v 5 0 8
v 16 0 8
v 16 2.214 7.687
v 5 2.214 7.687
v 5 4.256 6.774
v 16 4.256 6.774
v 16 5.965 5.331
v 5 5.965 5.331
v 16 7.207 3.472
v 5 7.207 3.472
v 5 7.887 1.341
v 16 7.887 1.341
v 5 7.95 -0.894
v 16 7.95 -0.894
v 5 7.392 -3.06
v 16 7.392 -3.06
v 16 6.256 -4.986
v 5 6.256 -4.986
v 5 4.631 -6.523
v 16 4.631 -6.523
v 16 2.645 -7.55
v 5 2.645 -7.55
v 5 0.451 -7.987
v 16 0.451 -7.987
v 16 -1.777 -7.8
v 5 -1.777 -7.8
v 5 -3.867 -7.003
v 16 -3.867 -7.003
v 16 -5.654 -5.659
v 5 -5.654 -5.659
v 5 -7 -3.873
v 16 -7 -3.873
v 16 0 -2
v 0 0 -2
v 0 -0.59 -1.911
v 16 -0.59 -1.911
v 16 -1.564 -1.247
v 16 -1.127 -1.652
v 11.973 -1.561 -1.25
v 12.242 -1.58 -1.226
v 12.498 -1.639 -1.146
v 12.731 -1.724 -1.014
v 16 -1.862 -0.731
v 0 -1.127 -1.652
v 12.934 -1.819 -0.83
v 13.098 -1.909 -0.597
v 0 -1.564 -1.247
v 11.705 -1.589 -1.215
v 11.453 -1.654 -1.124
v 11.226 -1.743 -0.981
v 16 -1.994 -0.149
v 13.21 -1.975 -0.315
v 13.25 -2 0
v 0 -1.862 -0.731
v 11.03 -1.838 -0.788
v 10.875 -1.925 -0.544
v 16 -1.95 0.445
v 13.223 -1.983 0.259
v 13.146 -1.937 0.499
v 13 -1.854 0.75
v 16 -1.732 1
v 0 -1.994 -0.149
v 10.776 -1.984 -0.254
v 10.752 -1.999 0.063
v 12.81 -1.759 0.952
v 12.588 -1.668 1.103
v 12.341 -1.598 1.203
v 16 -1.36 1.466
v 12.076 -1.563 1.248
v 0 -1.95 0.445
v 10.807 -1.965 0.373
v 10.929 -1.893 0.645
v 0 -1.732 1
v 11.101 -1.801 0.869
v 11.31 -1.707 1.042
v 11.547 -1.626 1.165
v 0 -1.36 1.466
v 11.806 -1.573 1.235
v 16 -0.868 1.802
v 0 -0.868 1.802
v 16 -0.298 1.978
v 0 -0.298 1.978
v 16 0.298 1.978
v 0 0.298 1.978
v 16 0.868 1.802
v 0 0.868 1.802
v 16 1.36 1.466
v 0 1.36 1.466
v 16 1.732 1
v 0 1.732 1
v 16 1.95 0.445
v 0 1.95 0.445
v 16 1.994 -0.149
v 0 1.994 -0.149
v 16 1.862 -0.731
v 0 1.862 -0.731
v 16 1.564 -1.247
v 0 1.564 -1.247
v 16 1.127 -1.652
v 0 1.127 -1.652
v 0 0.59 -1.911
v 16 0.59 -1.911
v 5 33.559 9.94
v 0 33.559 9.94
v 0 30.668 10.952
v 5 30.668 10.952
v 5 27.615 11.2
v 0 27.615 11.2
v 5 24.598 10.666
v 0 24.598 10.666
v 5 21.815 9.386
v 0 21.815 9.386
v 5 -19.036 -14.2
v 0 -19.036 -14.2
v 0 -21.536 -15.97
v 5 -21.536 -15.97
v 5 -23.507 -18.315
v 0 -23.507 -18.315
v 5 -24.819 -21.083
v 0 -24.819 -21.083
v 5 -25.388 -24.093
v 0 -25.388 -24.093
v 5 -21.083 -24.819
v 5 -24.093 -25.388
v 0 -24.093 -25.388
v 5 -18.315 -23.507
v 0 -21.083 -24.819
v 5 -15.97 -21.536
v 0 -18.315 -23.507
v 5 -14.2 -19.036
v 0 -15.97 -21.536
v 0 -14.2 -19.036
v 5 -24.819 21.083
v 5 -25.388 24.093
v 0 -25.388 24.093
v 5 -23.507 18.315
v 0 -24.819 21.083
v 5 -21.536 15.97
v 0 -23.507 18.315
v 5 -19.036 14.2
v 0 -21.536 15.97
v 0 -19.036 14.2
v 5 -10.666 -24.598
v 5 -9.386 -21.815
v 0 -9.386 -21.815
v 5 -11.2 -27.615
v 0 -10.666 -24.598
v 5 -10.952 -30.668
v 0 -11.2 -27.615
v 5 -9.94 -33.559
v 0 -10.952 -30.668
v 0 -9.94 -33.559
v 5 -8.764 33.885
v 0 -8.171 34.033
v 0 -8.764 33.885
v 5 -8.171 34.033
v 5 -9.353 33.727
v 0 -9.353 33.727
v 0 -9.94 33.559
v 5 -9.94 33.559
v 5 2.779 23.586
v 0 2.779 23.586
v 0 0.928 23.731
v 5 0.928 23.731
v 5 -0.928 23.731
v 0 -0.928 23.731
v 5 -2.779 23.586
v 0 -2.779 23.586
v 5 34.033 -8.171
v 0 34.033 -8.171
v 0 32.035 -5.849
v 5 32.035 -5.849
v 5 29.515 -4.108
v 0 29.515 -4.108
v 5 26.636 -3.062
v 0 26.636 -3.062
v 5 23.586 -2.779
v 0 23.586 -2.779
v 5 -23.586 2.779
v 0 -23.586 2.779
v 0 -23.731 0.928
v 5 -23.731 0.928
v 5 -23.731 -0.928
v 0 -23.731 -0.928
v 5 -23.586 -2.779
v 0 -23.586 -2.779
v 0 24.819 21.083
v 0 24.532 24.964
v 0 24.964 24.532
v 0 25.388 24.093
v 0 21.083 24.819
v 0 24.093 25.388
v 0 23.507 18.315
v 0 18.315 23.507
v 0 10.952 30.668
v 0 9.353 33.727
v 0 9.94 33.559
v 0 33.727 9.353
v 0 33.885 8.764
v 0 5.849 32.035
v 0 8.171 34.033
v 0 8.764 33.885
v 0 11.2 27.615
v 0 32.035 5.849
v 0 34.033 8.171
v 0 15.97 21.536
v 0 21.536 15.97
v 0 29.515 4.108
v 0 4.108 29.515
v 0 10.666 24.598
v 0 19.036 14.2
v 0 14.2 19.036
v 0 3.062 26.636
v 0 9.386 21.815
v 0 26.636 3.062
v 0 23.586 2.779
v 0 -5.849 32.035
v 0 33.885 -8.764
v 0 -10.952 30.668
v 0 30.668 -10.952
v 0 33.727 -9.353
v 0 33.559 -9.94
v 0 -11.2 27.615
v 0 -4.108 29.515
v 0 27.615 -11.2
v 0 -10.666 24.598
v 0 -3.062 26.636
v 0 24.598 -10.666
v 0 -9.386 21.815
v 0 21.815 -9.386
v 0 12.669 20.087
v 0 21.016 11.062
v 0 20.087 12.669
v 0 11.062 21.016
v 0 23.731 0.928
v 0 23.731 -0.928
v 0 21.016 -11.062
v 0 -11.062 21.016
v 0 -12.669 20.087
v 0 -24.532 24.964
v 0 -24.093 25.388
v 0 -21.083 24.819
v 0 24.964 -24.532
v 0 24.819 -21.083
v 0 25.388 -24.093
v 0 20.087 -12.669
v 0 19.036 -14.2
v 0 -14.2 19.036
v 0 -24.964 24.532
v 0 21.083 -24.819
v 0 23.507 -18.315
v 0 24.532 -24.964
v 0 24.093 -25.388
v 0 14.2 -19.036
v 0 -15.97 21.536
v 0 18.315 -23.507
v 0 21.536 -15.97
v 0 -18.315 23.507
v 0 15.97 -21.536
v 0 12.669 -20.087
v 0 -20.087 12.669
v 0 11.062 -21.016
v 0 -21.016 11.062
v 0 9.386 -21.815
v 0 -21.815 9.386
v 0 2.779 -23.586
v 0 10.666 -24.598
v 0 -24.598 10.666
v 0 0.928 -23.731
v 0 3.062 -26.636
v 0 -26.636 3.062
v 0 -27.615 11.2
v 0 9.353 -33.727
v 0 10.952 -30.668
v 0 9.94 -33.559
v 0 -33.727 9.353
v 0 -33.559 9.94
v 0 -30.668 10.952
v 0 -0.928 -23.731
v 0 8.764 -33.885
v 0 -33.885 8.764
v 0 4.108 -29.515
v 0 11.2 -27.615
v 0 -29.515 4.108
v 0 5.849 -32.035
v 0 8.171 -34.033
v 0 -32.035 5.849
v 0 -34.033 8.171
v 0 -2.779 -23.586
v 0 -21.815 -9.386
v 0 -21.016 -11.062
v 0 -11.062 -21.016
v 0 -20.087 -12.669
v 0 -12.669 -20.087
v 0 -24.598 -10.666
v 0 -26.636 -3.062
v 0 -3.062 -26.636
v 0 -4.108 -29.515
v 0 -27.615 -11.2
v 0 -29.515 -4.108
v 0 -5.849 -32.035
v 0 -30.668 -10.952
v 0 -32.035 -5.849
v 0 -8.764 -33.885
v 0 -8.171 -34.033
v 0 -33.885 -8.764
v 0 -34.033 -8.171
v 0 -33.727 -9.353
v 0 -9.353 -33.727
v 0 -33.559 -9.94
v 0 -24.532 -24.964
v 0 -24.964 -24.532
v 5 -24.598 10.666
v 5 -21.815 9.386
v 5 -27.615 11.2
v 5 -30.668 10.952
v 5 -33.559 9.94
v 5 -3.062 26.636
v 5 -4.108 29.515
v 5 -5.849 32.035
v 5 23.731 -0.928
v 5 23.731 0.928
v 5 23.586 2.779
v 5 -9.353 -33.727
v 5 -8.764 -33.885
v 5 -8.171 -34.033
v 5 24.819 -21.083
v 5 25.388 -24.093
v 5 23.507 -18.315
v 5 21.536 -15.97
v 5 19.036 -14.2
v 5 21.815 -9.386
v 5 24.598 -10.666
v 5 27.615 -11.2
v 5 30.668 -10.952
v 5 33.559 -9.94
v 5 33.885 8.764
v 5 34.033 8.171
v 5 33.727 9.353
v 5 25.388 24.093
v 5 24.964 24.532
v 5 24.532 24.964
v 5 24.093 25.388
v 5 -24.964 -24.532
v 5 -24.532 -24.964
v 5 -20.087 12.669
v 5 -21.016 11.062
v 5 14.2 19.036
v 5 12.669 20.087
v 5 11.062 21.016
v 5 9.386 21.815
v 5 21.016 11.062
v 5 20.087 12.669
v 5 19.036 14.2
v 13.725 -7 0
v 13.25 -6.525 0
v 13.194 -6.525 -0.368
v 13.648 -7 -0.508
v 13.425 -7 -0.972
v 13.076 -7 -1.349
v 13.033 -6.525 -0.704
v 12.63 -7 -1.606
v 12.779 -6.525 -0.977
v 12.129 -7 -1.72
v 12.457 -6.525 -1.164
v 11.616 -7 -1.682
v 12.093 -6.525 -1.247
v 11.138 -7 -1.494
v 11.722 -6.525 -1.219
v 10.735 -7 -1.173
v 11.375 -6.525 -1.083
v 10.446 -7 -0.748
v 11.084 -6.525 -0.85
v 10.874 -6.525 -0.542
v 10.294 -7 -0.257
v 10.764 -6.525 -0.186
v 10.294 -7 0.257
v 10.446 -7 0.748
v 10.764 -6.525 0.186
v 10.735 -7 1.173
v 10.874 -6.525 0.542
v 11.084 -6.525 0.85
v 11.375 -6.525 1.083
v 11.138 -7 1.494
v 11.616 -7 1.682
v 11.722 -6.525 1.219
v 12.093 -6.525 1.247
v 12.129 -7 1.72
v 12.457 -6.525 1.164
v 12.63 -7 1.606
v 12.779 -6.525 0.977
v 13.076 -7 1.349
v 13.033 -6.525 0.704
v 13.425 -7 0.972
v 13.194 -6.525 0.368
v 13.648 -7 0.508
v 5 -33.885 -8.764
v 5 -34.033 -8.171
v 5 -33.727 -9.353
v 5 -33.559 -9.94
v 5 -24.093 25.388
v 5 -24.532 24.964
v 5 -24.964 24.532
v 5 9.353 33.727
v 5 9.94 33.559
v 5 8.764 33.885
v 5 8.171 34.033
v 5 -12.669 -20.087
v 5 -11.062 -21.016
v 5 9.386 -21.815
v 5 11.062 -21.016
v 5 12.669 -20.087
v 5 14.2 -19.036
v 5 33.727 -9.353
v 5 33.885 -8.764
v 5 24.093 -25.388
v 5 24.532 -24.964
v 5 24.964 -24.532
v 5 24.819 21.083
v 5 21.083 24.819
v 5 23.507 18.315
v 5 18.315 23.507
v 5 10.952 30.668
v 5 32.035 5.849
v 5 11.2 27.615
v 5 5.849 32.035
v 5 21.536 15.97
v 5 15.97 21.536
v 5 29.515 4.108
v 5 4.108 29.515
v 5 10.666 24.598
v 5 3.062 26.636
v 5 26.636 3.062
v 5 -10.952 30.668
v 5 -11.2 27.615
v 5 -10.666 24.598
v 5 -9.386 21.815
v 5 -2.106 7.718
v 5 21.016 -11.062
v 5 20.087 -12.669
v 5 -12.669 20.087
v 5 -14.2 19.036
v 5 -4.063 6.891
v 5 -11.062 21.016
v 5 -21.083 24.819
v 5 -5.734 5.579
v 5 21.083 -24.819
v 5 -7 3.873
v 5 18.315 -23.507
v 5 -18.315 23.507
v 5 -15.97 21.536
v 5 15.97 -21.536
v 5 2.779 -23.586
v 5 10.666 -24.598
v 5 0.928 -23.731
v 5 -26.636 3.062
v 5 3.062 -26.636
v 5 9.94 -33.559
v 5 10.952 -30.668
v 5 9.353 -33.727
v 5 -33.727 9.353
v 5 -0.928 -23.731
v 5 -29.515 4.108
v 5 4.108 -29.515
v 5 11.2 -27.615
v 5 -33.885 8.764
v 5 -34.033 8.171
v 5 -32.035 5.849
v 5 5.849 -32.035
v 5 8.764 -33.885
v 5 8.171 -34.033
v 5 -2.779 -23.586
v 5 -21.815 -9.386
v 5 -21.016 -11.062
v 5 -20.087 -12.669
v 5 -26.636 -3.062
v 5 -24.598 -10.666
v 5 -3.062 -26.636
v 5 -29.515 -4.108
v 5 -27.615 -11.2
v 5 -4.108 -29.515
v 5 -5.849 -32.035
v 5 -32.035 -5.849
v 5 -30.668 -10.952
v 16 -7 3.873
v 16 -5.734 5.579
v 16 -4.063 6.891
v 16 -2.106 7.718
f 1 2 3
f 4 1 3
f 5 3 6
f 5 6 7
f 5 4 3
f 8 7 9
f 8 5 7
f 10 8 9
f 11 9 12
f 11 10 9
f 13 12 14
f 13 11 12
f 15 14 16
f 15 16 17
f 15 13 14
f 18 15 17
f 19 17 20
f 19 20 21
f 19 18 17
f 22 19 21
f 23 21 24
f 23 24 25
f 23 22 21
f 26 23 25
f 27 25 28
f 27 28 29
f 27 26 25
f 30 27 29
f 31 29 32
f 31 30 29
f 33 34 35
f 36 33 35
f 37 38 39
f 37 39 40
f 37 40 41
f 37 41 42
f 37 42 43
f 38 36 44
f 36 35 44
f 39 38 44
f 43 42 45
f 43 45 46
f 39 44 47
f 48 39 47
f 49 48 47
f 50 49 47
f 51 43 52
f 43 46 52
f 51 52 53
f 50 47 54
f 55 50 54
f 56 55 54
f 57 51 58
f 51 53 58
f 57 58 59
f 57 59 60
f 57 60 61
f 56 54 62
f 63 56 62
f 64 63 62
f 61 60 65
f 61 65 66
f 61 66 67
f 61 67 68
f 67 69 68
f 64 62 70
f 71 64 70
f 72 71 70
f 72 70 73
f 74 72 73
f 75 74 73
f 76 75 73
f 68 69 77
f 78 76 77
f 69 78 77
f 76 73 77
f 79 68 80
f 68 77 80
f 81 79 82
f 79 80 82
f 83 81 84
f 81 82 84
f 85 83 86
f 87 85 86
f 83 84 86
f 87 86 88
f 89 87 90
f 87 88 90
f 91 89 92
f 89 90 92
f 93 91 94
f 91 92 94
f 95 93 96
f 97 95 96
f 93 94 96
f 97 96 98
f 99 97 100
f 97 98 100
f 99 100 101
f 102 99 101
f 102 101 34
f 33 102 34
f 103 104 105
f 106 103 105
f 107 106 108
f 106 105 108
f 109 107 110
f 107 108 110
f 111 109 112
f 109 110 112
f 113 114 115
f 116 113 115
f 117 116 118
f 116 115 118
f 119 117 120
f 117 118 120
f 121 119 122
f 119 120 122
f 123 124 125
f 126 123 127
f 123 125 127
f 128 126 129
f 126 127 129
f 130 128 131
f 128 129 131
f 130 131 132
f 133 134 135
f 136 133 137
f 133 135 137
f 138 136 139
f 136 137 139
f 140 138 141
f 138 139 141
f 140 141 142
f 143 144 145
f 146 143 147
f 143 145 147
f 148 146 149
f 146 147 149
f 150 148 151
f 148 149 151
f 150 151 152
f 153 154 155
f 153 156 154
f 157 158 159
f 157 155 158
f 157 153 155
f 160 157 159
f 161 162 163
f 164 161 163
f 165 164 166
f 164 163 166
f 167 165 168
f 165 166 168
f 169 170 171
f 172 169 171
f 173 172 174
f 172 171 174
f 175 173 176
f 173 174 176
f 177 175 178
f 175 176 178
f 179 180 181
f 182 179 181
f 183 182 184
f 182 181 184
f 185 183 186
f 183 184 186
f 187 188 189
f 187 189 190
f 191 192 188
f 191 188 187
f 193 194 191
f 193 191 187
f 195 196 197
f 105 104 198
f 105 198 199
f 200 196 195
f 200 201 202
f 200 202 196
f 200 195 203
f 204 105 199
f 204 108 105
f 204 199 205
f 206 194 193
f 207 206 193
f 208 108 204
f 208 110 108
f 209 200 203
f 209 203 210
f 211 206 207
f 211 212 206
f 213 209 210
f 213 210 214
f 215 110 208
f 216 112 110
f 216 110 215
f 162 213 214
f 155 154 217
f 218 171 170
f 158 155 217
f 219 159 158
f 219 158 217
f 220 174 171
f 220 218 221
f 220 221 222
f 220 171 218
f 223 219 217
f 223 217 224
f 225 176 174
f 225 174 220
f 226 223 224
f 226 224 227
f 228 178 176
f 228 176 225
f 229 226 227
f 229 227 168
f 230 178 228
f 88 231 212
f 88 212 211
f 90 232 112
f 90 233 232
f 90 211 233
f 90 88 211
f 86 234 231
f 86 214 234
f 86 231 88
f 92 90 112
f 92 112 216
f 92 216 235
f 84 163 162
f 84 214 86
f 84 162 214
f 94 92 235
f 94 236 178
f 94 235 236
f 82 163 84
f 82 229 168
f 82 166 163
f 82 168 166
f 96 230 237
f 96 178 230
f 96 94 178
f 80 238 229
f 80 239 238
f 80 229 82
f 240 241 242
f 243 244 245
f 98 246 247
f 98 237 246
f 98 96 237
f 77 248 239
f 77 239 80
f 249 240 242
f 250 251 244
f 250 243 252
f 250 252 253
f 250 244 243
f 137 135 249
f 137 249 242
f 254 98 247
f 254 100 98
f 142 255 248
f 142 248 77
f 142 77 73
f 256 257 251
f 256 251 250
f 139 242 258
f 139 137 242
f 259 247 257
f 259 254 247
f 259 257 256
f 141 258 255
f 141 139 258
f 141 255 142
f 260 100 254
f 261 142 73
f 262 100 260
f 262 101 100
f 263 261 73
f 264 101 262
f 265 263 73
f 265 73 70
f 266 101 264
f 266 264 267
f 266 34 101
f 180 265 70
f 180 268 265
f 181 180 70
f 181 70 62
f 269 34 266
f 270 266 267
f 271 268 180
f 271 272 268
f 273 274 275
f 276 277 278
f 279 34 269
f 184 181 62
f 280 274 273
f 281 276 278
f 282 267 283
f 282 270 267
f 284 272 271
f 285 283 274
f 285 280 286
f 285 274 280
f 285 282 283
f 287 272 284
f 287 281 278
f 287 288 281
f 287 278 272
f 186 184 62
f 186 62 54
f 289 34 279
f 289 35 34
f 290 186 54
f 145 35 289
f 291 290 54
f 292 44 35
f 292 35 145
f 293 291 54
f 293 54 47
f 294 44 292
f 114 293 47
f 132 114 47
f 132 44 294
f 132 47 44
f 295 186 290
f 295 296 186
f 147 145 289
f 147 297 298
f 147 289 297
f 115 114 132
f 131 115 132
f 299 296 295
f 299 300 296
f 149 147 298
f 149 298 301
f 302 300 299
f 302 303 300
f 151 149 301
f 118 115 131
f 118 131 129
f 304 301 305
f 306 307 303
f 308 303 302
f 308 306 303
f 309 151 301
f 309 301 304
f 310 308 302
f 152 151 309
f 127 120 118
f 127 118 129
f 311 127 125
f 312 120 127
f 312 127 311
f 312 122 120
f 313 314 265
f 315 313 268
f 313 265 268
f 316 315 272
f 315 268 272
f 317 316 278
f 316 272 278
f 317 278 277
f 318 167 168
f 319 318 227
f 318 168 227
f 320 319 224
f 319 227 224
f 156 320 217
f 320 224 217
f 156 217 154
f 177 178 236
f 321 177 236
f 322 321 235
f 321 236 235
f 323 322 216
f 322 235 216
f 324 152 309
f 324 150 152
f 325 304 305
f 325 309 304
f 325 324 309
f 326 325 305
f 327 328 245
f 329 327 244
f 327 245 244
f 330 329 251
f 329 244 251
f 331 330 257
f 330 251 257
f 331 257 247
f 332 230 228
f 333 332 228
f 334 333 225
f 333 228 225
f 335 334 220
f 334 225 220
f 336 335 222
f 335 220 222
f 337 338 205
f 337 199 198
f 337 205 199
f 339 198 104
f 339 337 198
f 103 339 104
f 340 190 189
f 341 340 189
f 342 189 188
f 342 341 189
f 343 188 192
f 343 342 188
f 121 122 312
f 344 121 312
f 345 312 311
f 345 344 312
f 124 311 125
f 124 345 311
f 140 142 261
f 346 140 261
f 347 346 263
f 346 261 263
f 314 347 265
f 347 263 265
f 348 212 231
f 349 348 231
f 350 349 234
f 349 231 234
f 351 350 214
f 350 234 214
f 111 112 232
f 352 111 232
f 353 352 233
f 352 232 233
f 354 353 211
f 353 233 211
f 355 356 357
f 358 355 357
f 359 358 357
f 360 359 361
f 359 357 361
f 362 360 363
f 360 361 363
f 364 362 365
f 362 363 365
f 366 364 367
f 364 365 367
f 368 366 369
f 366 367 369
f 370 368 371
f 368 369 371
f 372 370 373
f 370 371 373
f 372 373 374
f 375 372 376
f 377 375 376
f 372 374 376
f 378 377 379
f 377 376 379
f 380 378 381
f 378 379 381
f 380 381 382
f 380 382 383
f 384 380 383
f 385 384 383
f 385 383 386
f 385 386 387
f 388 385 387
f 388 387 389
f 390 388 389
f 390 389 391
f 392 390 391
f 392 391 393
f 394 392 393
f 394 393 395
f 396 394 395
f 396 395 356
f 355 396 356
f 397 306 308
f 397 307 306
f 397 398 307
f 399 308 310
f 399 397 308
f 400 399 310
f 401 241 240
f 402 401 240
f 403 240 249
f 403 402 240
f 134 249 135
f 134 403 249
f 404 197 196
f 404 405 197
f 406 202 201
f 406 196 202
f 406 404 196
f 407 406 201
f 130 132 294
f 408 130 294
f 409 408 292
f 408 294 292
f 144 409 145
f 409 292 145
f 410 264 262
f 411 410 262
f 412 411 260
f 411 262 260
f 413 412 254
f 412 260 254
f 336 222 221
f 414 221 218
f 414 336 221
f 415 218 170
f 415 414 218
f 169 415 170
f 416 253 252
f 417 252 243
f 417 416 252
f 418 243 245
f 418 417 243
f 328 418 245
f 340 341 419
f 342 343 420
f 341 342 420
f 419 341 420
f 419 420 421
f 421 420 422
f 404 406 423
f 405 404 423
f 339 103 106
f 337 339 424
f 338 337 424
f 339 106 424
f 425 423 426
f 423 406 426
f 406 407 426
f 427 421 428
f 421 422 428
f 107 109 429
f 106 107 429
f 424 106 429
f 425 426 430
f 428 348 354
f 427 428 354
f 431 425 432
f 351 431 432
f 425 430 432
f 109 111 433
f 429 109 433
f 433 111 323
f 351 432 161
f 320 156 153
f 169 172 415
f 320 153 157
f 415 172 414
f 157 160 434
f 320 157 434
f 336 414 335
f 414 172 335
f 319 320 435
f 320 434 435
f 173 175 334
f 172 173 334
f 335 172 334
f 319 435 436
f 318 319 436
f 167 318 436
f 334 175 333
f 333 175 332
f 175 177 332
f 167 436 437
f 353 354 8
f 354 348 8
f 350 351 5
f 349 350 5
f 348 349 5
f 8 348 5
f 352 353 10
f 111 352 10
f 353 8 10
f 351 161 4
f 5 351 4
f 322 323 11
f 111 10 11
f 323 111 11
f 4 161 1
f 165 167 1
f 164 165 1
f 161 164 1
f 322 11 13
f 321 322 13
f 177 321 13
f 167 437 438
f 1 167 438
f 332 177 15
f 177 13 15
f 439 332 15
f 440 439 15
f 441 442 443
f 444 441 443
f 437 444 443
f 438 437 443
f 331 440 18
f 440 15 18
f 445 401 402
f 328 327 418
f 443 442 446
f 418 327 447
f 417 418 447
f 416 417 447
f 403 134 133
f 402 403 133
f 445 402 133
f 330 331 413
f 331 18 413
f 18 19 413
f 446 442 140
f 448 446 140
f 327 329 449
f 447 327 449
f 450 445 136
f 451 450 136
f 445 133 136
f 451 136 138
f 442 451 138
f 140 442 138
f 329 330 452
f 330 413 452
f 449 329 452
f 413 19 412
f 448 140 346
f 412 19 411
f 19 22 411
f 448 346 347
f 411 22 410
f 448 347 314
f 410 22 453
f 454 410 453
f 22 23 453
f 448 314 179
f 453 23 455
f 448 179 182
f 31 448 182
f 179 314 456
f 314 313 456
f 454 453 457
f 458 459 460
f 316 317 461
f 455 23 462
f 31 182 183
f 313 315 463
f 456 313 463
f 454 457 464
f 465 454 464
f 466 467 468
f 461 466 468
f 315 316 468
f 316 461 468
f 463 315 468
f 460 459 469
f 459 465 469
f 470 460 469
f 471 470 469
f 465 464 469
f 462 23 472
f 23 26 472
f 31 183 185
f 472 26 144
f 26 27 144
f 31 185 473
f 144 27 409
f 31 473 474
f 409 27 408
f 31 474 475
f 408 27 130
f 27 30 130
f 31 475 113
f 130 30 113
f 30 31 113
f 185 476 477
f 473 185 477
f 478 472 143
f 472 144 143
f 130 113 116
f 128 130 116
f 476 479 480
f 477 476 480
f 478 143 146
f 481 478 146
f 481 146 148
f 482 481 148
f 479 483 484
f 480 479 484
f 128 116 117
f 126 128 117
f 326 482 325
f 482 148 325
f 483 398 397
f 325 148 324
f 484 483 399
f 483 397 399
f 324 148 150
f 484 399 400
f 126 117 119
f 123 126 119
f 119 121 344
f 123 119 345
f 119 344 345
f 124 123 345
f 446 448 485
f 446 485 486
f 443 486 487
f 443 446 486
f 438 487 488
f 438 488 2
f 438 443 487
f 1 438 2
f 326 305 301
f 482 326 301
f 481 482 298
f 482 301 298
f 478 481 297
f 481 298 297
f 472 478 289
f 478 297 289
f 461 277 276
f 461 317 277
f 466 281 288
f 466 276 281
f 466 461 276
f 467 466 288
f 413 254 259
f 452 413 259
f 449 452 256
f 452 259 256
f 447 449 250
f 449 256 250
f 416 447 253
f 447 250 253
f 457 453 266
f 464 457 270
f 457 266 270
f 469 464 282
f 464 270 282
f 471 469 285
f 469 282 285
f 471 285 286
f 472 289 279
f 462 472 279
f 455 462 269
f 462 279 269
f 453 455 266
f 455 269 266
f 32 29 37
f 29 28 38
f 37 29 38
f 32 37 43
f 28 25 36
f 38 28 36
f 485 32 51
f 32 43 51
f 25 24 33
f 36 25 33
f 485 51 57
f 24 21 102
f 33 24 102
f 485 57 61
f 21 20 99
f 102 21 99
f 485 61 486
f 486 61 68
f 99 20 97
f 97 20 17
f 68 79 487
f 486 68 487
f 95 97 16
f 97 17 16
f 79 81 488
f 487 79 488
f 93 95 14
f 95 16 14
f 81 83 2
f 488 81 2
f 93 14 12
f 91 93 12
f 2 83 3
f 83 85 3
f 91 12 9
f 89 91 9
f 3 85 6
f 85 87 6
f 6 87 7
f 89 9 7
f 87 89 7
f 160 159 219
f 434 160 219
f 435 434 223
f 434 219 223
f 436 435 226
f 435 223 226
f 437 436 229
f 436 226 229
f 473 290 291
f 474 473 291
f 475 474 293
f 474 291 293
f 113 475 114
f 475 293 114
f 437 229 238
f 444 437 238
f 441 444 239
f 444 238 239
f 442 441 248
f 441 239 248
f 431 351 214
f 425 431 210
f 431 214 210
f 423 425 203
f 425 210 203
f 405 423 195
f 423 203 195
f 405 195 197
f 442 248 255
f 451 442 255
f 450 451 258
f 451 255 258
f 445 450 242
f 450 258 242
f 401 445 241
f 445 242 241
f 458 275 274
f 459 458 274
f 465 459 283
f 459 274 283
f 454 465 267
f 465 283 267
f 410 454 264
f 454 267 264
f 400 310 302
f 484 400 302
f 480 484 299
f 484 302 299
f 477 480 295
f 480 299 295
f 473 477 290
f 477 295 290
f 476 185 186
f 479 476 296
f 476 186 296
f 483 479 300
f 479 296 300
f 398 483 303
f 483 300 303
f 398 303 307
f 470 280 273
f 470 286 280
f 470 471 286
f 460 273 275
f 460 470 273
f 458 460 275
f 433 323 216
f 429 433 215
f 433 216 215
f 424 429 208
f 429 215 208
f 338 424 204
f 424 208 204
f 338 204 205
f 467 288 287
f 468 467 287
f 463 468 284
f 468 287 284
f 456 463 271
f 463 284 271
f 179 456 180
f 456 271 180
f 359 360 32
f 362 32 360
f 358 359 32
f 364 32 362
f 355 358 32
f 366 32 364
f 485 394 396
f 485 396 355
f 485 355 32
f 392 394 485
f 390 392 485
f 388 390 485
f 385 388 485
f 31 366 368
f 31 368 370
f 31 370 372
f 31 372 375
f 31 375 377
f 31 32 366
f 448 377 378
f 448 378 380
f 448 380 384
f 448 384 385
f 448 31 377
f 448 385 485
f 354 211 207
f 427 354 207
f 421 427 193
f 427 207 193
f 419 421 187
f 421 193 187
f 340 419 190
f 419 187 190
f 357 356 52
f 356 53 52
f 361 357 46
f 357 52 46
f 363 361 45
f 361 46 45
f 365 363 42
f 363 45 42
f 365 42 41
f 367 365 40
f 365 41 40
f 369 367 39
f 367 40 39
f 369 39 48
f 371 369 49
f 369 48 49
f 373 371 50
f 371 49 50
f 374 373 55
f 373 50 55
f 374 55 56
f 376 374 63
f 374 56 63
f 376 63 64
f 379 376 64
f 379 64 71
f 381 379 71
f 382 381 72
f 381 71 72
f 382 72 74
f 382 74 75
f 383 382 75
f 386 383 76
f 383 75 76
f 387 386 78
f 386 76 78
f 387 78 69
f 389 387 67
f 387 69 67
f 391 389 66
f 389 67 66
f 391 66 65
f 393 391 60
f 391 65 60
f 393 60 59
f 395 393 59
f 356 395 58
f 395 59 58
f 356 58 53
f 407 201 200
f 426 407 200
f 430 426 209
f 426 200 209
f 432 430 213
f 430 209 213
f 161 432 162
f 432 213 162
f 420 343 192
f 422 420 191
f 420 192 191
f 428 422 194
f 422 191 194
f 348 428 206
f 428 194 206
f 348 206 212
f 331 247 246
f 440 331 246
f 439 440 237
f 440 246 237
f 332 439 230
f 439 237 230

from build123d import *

# Parameters (mm, degrees)
BASPROSKE_W                     = 5
BASPROSKE_H                     = 35
TOOTHCUT_DEPTH                  = 50.749371855
TEETHCUTS_COUNT                 = 12
TEETHCUTS_ANGLE                 = 330
BORSKE_R                        = 0.4
BORE_DEPTH                      = 50.0000508
SKETCH1_R                       = 2
CUT_EXTRUDE1_DEPTH              = 49.388618122
SKETCH2_R                       = 2
BOSS_EXTRUDE1_DEPTH             = 11
M3X0_5_TAPPED_HOLE1_D           = 2.5
M3X0_5_TAPPED_HOLE1_DEPTH       = 7.5
M3X0_5_TAPPED_HOLE1_CSINK_D     = 3.45
M3X0_5_TAPPED_HOLE1_CSINK_ANGLE = 90
M3X0_5_TAPPED_HOLE1_TIP         = 0.751075774


with BuildPart() as part:
    # BasProSke → Base-Revolve (revolve)
    with BuildSketch(Plane(origin=(0, 0, 0), x_dir=(1, 0, 0), z_dir=(0, 1, 0)), mode=Mode.PRIVATE) as base_revolve_sk:
        with Locations((2.5, 17.5)):
            Rectangle(BASPROSKE_W, BASPROSKE_H)
    revolve(base_revolve_sk.sketch.rotate(Axis((-10, 0, 0), (1, 0, 0)), 180), axis=Axis((-10, 0, 0), (1, 0, 0)))

    # TooCutSke → ToothCut (cut, through all)
    with BuildSketch(Plane(origin=(0, 0, 0), x_dir=(0, 0, -1), z_dir=(1, 0, 0))):
        with BuildLine():
            ThreePointArc((2.779025365, 23.585843615), (0, 23.749), (-2.779025365, 23.585843615))
            ThreePointArc((-2.779025365, 23.585843615), (-4.116196739, 29.530367698), (-8.200466404, 34.051886819))
            ThreePointArc((-8.200466404, 34.051886819), (0, 35.0254), (8.200466404, 34.051886819))
            ThreePointArc((8.200466404, 34.051886819), (4.116196739, 29.530367698), (2.779025365, 23.585843615))
        make_face()
    toothcut = extrude(amount=TOOTHCUT_DEPTH, mode=Mode.SUBTRACT)

    # TeethCuts: ToothCut ×12 about axis
    teethcuts_axis = Axis((-10, 0, 0), (1, 0, 0))
    for i in range(1, TEETHCUTS_COUNT):
        add(toothcut.rotate(teethcuts_axis, i * TEETHCUTS_ANGLE / (TEETHCUTS_COUNT - 1)), mode=Mode.SUBTRACT)

    # BorSke → Bore (cut, symmetric)
    with BuildSketch(Plane(origin=(0, 0, 0), x_dir=(0, 0, -1), z_dir=(1, 0, 0))):
        with Locations(Location((0, 0, 0), (0, 0, 180))):
            Circle(BORSKE_R)
    extrude(amount=BORE_DEPTH, both=True, mode=Mode.SUBTRACT)

    # Sketch1 → Cut-Extrude1 (cut, through all)
    with BuildSketch(Plane(origin=(5, 0, 0), x_dir=(0, 0, -1), z_dir=(1, 0, 0))):
        Circle(SKETCH1_R)
    extrude(amount=-CUT_EXTRUDE1_DEPTH, mode=Mode.SUBTRACT)

    # Sketch2 → Boss-Extrude1 (add)
    with BuildSketch(Plane.ZY.offset(-5)):
        with BuildLine():
            Line((-3.872983346, -7), (3.872983346, -7))
            ThreePointArc((3.872983346, -7), (6.891439137, -4.063012013), (8, 0))
            ThreePointArc((8, 0), (-4.063012013, 6.891439137), (-3.872983346, -7))
        make_face()
        with Locations(Location((0, 0, 0), (0, 0, 180))):
            Circle(SKETCH2_R, mode=Mode.SUBTRACT)
    extrude(amount=-BOSS_EXTRUDE1_DEPTH)

    # M3x0.5 Tapped Hole1
    with Locations(Plane(origin=(0, -7, 0), x_dir=(-1, 0, 0), z_dir=(0, -1, 0))):
        with Locations((-12, 0)):
            CounterSinkHole(M3X0_5_TAPPED_HOLE1_D / 2, M3X0_5_TAPPED_HOLE1_CSINK_D / 2, depth=M3X0_5_TAPPED_HOLE1_DEPTH, counter_sink_angle=M3X0_5_TAPPED_HOLE1_CSINK_ANGLE)
            with Locations((0, 0, -(M3X0_5_TAPPED_HOLE1_DEPTH + M3X0_5_TAPPED_HOLE1_TIP / 2))):  # 118° drill point
                Cone(0, M3X0_5_TAPPED_HOLE1_D / 2, M3X0_5_TAPPED_HOLE1_TIP, mode=Mode.SUBTRACT)


solid = part.part
